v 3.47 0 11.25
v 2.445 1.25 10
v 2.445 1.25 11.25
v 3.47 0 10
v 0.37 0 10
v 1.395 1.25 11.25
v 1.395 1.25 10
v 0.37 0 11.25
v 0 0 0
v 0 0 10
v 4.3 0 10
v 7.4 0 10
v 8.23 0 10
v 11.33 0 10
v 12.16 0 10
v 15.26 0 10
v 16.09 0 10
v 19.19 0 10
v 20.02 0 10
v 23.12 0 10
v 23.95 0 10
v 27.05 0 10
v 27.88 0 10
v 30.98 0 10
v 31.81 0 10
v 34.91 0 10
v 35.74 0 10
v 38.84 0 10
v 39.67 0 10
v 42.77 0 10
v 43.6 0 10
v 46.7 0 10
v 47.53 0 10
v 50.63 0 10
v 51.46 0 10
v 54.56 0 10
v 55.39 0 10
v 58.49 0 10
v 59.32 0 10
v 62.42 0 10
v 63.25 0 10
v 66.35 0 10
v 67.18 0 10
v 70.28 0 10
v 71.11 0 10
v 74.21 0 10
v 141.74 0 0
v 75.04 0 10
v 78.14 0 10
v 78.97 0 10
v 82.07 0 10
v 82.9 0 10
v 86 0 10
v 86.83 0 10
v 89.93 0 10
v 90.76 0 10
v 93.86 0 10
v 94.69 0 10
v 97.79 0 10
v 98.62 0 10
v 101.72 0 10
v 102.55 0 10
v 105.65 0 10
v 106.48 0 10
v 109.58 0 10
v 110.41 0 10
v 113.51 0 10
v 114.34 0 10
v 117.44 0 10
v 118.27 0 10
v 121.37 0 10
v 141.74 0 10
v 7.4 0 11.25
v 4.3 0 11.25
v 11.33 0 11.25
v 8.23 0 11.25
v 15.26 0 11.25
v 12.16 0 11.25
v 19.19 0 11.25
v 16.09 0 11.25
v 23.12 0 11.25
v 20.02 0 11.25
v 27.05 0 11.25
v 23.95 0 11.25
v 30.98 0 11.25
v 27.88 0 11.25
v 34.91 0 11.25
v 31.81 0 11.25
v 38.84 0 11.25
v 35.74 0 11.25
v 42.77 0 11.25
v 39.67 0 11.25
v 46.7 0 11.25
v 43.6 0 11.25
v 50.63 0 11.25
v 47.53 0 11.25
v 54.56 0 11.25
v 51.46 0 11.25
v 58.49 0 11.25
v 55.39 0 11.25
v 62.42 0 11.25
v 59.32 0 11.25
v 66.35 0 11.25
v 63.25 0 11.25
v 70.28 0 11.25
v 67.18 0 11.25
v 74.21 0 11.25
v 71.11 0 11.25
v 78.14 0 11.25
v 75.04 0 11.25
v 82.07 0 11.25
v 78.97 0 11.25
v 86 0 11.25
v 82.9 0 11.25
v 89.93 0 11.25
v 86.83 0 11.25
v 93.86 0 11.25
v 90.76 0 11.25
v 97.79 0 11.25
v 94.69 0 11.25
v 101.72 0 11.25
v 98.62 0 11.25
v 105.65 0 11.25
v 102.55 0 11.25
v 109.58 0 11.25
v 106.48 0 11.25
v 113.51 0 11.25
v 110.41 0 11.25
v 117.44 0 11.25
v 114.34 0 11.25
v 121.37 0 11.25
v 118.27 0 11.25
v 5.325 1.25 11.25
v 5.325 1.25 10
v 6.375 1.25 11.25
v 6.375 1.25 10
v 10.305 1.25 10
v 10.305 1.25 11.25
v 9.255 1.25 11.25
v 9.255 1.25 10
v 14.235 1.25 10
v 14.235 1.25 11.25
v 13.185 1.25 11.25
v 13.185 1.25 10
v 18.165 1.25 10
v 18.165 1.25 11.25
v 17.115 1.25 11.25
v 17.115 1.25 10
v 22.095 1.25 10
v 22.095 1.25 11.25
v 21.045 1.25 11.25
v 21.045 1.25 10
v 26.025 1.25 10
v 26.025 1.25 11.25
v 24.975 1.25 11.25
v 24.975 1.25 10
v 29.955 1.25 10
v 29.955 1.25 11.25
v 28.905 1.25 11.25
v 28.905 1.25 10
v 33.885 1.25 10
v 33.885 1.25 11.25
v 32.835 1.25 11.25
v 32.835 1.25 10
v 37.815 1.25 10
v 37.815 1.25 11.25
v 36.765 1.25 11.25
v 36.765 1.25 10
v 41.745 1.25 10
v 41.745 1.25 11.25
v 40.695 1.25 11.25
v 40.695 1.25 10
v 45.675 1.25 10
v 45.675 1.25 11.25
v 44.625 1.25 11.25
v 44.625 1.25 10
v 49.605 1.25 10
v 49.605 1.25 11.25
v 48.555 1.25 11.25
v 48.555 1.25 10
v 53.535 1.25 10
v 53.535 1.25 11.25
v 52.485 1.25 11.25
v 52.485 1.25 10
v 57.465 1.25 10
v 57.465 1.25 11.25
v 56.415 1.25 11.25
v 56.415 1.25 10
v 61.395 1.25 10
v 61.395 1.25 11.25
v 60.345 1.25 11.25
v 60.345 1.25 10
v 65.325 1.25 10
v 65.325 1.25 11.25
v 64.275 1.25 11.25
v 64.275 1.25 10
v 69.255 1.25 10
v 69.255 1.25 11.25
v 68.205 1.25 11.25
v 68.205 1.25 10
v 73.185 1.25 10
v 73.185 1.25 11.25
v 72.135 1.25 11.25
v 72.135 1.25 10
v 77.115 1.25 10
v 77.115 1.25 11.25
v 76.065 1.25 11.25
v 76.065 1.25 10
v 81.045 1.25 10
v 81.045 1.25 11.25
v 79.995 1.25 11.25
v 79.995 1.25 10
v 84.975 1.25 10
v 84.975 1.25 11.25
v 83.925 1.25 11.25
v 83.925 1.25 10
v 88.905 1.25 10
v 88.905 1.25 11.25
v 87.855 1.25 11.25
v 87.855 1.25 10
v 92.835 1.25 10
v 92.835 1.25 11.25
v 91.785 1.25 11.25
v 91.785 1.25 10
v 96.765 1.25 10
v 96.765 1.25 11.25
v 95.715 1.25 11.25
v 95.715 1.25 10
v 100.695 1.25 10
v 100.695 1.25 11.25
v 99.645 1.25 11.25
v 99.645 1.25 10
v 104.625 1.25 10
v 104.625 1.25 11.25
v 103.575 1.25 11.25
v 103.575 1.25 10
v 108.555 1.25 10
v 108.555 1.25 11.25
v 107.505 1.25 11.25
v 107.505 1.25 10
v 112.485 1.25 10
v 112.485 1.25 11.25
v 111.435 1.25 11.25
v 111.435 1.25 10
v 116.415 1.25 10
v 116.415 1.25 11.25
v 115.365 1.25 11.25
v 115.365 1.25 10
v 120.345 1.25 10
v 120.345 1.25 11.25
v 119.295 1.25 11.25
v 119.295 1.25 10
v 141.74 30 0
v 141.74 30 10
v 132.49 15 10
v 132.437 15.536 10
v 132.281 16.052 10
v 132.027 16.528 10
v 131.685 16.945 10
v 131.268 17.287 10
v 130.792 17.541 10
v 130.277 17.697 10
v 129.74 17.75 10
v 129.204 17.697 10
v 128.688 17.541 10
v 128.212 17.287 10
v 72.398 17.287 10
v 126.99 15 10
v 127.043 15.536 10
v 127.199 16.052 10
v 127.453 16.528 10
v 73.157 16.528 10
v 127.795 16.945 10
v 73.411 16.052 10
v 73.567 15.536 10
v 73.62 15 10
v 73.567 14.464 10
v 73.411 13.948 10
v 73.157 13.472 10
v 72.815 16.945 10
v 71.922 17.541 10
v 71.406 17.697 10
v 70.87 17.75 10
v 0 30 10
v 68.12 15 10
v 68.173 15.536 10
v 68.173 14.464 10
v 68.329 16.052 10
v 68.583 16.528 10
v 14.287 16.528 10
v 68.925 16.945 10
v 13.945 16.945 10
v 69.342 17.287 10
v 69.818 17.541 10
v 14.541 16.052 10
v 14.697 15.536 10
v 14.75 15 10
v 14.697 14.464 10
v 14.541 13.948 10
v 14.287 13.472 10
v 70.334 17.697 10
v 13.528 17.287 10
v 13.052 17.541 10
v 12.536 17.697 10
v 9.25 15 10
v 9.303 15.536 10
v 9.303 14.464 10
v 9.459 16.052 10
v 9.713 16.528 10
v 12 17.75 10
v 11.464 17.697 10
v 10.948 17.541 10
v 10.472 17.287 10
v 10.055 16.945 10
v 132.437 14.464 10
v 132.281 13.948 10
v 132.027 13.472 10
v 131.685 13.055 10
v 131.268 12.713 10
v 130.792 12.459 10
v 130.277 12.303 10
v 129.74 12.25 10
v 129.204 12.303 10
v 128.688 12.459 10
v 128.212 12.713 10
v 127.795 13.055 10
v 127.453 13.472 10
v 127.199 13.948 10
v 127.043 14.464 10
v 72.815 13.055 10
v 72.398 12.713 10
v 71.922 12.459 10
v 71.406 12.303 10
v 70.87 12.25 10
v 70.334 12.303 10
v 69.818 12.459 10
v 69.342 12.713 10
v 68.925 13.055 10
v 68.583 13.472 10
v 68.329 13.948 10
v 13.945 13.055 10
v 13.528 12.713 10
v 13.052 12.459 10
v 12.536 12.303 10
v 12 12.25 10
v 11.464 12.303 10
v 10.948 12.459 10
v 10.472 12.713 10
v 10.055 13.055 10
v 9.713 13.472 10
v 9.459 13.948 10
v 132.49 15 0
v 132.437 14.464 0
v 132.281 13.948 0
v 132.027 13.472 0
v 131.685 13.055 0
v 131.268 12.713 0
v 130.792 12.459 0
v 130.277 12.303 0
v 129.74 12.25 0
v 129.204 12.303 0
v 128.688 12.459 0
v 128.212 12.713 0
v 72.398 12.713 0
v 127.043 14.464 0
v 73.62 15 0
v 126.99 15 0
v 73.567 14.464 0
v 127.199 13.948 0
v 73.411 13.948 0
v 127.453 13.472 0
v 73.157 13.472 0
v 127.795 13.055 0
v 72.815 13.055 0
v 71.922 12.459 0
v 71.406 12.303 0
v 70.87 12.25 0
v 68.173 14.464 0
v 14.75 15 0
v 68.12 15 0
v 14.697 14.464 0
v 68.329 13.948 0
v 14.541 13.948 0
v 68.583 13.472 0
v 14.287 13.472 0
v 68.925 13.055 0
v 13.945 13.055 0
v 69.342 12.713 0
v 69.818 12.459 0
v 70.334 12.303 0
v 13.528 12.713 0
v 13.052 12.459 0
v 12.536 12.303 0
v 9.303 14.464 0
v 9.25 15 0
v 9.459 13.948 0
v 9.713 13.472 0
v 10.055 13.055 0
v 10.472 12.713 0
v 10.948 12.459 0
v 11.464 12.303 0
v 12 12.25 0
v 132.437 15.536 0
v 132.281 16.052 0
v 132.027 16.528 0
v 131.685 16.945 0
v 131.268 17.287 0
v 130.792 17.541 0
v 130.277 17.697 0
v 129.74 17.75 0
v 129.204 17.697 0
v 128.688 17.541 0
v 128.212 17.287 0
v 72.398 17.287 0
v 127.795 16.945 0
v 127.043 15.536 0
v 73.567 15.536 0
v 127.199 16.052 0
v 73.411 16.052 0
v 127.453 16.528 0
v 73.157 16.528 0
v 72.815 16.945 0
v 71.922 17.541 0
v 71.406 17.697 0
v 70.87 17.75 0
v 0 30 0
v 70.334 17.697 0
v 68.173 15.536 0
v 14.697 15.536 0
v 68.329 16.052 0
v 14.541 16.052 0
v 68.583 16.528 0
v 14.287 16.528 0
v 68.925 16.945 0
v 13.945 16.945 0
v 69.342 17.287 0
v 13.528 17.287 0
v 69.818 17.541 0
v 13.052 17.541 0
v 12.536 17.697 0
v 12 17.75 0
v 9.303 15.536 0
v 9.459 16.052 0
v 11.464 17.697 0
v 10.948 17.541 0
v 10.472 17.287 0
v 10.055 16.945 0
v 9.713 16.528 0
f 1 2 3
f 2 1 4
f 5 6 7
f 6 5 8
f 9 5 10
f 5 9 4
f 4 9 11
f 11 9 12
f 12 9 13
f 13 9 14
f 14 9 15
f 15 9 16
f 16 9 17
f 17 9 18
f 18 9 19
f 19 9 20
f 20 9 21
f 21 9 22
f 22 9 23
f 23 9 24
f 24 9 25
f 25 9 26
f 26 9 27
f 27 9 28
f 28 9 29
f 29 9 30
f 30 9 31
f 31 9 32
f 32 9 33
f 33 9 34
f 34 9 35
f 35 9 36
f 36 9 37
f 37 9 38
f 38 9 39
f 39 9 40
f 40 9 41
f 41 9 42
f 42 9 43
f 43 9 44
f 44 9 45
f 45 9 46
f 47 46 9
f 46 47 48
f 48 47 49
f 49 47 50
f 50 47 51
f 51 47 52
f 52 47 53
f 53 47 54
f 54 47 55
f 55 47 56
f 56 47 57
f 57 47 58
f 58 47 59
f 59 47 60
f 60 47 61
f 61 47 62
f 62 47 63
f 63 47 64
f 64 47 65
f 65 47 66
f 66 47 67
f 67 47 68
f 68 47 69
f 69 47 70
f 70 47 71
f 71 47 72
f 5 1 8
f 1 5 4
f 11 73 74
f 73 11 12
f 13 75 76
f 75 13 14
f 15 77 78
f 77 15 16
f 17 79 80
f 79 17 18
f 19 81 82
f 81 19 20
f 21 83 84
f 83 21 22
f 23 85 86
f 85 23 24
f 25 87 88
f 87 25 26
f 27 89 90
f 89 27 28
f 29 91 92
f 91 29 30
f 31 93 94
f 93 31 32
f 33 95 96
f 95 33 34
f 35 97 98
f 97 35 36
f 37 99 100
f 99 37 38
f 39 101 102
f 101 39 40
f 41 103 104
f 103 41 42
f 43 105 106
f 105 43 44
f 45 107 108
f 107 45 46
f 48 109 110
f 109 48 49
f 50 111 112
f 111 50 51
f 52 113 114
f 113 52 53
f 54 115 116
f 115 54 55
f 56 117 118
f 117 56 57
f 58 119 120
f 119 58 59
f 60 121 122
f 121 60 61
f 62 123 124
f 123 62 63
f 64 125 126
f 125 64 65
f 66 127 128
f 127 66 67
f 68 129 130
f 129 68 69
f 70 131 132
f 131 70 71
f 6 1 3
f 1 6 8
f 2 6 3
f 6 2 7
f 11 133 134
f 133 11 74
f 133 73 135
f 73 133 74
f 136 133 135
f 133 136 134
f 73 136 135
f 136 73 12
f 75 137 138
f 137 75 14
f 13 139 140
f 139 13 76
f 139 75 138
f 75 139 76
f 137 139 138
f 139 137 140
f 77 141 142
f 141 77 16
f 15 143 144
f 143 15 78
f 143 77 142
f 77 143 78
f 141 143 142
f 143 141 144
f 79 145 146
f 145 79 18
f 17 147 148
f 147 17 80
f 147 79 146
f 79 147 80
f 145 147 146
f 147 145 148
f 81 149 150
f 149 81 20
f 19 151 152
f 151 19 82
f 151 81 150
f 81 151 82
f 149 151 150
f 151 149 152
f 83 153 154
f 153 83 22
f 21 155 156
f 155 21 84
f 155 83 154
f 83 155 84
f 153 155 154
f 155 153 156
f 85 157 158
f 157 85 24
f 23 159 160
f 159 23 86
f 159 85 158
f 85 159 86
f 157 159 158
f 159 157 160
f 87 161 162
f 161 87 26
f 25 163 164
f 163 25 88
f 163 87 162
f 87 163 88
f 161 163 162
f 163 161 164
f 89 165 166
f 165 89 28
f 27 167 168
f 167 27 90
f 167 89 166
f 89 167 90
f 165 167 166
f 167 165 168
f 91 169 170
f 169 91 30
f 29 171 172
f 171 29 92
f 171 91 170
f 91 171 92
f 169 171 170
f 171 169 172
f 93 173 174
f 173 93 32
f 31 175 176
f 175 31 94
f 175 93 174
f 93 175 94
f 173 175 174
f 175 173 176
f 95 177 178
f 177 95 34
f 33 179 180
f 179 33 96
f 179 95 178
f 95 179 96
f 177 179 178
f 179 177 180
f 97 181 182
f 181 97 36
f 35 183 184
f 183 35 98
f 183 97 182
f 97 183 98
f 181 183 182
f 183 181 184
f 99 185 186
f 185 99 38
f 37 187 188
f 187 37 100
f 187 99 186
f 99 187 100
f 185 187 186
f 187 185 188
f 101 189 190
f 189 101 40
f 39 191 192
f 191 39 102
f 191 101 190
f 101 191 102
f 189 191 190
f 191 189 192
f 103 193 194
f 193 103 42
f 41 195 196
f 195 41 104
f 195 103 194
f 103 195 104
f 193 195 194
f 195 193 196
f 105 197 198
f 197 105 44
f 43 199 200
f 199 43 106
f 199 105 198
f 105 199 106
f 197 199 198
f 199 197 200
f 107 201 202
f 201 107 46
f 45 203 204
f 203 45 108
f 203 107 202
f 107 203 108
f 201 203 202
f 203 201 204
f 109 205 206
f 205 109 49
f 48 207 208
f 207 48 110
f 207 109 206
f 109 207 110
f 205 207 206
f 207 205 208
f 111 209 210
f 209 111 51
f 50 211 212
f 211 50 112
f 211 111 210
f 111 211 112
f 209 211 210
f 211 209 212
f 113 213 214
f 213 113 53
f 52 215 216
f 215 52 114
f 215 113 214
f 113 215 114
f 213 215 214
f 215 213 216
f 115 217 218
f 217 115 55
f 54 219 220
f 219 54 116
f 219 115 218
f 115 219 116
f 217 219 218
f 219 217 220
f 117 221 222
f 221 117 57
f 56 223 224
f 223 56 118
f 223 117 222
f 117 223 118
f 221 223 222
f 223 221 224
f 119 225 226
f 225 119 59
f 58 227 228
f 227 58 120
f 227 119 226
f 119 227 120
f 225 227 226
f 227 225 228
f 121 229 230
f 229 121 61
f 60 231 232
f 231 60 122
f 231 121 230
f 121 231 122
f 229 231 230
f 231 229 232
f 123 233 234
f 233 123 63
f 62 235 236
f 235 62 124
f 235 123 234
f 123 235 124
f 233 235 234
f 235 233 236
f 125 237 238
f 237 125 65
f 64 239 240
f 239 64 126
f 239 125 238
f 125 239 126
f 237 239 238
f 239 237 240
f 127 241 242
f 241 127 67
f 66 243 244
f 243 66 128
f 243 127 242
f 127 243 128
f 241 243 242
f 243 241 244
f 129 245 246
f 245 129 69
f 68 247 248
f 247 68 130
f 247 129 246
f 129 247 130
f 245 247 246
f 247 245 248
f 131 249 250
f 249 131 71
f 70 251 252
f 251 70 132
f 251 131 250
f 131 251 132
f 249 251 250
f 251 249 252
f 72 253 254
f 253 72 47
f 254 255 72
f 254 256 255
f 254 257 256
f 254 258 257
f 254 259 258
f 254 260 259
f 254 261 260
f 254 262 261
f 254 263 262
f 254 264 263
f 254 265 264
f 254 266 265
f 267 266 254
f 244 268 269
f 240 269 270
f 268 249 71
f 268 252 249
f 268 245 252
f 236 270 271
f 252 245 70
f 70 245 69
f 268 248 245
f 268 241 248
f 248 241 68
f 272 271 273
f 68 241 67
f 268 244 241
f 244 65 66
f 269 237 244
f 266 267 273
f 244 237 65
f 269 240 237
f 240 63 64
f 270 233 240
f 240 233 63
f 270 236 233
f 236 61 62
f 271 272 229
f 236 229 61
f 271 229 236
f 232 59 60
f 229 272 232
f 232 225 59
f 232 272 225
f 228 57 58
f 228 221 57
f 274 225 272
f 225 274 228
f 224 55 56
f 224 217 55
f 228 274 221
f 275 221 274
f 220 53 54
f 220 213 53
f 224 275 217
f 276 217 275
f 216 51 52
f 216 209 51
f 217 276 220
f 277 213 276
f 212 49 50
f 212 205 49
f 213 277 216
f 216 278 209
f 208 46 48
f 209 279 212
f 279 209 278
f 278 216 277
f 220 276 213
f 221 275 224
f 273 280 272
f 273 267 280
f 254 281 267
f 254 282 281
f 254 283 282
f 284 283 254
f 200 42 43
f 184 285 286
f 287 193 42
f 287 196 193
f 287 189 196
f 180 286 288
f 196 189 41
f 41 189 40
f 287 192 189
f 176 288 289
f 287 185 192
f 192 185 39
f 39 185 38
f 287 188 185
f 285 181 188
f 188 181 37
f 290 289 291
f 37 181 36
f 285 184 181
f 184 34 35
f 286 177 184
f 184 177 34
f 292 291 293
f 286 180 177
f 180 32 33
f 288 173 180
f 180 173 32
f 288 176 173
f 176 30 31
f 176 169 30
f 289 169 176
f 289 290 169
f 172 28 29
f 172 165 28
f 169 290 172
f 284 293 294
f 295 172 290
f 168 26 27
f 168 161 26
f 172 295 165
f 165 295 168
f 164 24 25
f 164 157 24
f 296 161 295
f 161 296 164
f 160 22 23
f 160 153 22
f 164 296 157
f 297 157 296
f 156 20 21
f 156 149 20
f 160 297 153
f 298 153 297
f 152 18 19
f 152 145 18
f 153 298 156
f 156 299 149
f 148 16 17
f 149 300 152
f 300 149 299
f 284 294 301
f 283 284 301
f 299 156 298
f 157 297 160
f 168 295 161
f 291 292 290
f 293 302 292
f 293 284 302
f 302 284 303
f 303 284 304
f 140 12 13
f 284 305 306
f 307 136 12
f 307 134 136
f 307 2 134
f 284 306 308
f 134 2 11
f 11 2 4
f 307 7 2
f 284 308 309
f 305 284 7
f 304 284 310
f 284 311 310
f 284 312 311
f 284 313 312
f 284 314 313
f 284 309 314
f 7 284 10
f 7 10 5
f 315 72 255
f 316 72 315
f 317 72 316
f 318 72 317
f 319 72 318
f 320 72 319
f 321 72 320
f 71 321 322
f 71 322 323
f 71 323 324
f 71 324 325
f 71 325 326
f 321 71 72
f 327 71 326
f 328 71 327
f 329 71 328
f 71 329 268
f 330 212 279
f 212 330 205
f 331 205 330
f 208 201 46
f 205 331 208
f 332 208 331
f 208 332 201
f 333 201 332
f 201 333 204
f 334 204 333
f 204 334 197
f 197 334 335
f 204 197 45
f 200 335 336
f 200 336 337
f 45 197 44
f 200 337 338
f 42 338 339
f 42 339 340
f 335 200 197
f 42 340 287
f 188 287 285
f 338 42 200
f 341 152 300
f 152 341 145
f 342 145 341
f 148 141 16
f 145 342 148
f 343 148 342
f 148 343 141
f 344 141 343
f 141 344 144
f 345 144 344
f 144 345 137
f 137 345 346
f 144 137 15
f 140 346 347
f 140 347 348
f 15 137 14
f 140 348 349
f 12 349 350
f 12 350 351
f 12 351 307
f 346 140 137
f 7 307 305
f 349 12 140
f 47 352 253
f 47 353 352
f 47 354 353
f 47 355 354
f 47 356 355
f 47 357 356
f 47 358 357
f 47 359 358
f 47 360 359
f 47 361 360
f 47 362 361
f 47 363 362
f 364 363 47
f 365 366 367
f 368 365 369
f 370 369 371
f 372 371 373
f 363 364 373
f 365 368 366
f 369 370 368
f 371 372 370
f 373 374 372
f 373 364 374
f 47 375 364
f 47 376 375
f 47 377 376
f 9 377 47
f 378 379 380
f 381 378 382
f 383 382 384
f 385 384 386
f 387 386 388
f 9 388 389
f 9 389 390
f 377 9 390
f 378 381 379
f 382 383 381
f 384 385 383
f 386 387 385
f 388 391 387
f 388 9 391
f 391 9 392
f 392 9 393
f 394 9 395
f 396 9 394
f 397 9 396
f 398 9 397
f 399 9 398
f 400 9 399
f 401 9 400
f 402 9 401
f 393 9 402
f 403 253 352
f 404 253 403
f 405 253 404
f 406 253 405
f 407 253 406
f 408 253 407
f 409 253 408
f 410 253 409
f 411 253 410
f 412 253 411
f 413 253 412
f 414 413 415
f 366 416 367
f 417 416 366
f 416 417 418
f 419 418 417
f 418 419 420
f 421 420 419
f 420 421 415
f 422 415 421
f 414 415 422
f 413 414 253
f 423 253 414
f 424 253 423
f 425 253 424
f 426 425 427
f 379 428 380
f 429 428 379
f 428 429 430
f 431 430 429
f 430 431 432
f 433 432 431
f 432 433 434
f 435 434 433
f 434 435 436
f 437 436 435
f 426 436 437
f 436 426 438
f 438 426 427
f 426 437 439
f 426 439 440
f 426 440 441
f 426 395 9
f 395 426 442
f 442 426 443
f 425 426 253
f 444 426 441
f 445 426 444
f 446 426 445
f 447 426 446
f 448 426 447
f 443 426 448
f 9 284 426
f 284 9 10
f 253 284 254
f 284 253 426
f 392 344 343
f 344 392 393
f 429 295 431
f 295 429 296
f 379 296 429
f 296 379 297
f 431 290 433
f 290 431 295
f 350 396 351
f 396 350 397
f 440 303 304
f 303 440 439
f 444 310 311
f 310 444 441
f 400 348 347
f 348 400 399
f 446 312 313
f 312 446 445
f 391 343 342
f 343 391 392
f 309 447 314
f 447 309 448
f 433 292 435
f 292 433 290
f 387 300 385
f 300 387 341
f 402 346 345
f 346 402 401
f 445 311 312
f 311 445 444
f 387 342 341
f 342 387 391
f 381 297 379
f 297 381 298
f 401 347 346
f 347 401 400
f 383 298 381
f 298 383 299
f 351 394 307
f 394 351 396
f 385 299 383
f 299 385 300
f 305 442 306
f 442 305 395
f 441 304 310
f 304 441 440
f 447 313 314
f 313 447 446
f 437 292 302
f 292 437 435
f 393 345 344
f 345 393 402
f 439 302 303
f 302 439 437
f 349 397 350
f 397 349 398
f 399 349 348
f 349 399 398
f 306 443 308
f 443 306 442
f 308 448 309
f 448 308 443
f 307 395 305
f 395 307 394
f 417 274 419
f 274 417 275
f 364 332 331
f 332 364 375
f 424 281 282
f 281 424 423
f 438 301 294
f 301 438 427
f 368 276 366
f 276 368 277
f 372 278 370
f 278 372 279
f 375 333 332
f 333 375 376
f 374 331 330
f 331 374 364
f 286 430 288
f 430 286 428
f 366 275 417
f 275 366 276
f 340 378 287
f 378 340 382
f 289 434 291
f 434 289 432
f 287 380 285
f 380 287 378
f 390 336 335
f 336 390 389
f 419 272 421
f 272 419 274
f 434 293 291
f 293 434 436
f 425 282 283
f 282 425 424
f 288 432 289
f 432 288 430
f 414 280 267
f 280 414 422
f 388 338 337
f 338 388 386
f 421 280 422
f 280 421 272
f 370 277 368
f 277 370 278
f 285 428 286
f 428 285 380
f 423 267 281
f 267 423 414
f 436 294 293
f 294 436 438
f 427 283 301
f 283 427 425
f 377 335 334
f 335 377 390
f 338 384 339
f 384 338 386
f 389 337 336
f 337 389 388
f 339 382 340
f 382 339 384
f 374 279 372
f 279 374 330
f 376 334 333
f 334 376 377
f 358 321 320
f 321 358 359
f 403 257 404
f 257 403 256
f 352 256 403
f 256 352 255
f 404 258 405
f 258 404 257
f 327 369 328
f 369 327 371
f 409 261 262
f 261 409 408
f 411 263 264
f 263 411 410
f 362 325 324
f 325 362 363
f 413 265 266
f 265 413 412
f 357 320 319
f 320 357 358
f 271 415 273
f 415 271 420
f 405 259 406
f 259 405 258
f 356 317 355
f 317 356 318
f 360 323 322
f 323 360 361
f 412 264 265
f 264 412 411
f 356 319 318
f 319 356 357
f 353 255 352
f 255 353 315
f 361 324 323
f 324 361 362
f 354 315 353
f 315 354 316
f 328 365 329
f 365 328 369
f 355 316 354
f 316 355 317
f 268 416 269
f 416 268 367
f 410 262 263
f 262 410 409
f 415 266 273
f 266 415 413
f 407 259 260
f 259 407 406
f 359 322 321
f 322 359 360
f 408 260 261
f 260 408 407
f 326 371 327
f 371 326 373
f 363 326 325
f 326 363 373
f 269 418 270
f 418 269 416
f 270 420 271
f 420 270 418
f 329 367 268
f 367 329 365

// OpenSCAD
$fn = 32;
// ----------------------------------------------------------------------
// Gear rack: m=1.25 z=31, 141.74 x 30 x 11.25 mm
// ----------------------------------------------------------------------

// --- parameters (mm) ---
bar_len = 141.74;         // rack length, X
bar_w = 30;               // rack width, Y
bar_h = 11.25;            // overall height, Z
gear_module = 1.25;       // module
base_t = 10;              // tooth root line height
pitch = 3.93;             // circular pitch
tip_w = 1.05;             // tooth thickness at the tip
root_w = 3.1;             // tooth thickness at the root line
hole_d = 5.5;             // mounting hole
sink = 0.6;               // tooth root overlap into the body

tooth_span = 121.74;

module tooth(x0) {
  /* 20 deg flank profile, sunk into the body for a positive overlap */
  translate([x0, 0, base_t - sink])
    linear_extrude(height = bar_h - base_t + sink)
      polygon(points = [[-root_w / 2, 0], [root_w / 2, 0],
                        [tip_w / 2, bar_h - base_t],
                        [-tip_w / 2, bar_h - base_t]]);
}

difference() {
  union() {
    cube([bar_len, bar_w, base_t]);
    for (i = [0 : 31 - 1])
      tooth((i + 0.5) * pitch + (tooth_span - 31 * pitch) / 2);
  }
  translate([12, 15, -1]) cylinder(h = base_t + 2, d = hole_d);
  translate([70.87, 15, -1]) cylinder(h = base_t + 2, d = hole_d);
  translate([129.74, 15, -1]) cylinder(h = base_t + 2, d = hole_d);
}
